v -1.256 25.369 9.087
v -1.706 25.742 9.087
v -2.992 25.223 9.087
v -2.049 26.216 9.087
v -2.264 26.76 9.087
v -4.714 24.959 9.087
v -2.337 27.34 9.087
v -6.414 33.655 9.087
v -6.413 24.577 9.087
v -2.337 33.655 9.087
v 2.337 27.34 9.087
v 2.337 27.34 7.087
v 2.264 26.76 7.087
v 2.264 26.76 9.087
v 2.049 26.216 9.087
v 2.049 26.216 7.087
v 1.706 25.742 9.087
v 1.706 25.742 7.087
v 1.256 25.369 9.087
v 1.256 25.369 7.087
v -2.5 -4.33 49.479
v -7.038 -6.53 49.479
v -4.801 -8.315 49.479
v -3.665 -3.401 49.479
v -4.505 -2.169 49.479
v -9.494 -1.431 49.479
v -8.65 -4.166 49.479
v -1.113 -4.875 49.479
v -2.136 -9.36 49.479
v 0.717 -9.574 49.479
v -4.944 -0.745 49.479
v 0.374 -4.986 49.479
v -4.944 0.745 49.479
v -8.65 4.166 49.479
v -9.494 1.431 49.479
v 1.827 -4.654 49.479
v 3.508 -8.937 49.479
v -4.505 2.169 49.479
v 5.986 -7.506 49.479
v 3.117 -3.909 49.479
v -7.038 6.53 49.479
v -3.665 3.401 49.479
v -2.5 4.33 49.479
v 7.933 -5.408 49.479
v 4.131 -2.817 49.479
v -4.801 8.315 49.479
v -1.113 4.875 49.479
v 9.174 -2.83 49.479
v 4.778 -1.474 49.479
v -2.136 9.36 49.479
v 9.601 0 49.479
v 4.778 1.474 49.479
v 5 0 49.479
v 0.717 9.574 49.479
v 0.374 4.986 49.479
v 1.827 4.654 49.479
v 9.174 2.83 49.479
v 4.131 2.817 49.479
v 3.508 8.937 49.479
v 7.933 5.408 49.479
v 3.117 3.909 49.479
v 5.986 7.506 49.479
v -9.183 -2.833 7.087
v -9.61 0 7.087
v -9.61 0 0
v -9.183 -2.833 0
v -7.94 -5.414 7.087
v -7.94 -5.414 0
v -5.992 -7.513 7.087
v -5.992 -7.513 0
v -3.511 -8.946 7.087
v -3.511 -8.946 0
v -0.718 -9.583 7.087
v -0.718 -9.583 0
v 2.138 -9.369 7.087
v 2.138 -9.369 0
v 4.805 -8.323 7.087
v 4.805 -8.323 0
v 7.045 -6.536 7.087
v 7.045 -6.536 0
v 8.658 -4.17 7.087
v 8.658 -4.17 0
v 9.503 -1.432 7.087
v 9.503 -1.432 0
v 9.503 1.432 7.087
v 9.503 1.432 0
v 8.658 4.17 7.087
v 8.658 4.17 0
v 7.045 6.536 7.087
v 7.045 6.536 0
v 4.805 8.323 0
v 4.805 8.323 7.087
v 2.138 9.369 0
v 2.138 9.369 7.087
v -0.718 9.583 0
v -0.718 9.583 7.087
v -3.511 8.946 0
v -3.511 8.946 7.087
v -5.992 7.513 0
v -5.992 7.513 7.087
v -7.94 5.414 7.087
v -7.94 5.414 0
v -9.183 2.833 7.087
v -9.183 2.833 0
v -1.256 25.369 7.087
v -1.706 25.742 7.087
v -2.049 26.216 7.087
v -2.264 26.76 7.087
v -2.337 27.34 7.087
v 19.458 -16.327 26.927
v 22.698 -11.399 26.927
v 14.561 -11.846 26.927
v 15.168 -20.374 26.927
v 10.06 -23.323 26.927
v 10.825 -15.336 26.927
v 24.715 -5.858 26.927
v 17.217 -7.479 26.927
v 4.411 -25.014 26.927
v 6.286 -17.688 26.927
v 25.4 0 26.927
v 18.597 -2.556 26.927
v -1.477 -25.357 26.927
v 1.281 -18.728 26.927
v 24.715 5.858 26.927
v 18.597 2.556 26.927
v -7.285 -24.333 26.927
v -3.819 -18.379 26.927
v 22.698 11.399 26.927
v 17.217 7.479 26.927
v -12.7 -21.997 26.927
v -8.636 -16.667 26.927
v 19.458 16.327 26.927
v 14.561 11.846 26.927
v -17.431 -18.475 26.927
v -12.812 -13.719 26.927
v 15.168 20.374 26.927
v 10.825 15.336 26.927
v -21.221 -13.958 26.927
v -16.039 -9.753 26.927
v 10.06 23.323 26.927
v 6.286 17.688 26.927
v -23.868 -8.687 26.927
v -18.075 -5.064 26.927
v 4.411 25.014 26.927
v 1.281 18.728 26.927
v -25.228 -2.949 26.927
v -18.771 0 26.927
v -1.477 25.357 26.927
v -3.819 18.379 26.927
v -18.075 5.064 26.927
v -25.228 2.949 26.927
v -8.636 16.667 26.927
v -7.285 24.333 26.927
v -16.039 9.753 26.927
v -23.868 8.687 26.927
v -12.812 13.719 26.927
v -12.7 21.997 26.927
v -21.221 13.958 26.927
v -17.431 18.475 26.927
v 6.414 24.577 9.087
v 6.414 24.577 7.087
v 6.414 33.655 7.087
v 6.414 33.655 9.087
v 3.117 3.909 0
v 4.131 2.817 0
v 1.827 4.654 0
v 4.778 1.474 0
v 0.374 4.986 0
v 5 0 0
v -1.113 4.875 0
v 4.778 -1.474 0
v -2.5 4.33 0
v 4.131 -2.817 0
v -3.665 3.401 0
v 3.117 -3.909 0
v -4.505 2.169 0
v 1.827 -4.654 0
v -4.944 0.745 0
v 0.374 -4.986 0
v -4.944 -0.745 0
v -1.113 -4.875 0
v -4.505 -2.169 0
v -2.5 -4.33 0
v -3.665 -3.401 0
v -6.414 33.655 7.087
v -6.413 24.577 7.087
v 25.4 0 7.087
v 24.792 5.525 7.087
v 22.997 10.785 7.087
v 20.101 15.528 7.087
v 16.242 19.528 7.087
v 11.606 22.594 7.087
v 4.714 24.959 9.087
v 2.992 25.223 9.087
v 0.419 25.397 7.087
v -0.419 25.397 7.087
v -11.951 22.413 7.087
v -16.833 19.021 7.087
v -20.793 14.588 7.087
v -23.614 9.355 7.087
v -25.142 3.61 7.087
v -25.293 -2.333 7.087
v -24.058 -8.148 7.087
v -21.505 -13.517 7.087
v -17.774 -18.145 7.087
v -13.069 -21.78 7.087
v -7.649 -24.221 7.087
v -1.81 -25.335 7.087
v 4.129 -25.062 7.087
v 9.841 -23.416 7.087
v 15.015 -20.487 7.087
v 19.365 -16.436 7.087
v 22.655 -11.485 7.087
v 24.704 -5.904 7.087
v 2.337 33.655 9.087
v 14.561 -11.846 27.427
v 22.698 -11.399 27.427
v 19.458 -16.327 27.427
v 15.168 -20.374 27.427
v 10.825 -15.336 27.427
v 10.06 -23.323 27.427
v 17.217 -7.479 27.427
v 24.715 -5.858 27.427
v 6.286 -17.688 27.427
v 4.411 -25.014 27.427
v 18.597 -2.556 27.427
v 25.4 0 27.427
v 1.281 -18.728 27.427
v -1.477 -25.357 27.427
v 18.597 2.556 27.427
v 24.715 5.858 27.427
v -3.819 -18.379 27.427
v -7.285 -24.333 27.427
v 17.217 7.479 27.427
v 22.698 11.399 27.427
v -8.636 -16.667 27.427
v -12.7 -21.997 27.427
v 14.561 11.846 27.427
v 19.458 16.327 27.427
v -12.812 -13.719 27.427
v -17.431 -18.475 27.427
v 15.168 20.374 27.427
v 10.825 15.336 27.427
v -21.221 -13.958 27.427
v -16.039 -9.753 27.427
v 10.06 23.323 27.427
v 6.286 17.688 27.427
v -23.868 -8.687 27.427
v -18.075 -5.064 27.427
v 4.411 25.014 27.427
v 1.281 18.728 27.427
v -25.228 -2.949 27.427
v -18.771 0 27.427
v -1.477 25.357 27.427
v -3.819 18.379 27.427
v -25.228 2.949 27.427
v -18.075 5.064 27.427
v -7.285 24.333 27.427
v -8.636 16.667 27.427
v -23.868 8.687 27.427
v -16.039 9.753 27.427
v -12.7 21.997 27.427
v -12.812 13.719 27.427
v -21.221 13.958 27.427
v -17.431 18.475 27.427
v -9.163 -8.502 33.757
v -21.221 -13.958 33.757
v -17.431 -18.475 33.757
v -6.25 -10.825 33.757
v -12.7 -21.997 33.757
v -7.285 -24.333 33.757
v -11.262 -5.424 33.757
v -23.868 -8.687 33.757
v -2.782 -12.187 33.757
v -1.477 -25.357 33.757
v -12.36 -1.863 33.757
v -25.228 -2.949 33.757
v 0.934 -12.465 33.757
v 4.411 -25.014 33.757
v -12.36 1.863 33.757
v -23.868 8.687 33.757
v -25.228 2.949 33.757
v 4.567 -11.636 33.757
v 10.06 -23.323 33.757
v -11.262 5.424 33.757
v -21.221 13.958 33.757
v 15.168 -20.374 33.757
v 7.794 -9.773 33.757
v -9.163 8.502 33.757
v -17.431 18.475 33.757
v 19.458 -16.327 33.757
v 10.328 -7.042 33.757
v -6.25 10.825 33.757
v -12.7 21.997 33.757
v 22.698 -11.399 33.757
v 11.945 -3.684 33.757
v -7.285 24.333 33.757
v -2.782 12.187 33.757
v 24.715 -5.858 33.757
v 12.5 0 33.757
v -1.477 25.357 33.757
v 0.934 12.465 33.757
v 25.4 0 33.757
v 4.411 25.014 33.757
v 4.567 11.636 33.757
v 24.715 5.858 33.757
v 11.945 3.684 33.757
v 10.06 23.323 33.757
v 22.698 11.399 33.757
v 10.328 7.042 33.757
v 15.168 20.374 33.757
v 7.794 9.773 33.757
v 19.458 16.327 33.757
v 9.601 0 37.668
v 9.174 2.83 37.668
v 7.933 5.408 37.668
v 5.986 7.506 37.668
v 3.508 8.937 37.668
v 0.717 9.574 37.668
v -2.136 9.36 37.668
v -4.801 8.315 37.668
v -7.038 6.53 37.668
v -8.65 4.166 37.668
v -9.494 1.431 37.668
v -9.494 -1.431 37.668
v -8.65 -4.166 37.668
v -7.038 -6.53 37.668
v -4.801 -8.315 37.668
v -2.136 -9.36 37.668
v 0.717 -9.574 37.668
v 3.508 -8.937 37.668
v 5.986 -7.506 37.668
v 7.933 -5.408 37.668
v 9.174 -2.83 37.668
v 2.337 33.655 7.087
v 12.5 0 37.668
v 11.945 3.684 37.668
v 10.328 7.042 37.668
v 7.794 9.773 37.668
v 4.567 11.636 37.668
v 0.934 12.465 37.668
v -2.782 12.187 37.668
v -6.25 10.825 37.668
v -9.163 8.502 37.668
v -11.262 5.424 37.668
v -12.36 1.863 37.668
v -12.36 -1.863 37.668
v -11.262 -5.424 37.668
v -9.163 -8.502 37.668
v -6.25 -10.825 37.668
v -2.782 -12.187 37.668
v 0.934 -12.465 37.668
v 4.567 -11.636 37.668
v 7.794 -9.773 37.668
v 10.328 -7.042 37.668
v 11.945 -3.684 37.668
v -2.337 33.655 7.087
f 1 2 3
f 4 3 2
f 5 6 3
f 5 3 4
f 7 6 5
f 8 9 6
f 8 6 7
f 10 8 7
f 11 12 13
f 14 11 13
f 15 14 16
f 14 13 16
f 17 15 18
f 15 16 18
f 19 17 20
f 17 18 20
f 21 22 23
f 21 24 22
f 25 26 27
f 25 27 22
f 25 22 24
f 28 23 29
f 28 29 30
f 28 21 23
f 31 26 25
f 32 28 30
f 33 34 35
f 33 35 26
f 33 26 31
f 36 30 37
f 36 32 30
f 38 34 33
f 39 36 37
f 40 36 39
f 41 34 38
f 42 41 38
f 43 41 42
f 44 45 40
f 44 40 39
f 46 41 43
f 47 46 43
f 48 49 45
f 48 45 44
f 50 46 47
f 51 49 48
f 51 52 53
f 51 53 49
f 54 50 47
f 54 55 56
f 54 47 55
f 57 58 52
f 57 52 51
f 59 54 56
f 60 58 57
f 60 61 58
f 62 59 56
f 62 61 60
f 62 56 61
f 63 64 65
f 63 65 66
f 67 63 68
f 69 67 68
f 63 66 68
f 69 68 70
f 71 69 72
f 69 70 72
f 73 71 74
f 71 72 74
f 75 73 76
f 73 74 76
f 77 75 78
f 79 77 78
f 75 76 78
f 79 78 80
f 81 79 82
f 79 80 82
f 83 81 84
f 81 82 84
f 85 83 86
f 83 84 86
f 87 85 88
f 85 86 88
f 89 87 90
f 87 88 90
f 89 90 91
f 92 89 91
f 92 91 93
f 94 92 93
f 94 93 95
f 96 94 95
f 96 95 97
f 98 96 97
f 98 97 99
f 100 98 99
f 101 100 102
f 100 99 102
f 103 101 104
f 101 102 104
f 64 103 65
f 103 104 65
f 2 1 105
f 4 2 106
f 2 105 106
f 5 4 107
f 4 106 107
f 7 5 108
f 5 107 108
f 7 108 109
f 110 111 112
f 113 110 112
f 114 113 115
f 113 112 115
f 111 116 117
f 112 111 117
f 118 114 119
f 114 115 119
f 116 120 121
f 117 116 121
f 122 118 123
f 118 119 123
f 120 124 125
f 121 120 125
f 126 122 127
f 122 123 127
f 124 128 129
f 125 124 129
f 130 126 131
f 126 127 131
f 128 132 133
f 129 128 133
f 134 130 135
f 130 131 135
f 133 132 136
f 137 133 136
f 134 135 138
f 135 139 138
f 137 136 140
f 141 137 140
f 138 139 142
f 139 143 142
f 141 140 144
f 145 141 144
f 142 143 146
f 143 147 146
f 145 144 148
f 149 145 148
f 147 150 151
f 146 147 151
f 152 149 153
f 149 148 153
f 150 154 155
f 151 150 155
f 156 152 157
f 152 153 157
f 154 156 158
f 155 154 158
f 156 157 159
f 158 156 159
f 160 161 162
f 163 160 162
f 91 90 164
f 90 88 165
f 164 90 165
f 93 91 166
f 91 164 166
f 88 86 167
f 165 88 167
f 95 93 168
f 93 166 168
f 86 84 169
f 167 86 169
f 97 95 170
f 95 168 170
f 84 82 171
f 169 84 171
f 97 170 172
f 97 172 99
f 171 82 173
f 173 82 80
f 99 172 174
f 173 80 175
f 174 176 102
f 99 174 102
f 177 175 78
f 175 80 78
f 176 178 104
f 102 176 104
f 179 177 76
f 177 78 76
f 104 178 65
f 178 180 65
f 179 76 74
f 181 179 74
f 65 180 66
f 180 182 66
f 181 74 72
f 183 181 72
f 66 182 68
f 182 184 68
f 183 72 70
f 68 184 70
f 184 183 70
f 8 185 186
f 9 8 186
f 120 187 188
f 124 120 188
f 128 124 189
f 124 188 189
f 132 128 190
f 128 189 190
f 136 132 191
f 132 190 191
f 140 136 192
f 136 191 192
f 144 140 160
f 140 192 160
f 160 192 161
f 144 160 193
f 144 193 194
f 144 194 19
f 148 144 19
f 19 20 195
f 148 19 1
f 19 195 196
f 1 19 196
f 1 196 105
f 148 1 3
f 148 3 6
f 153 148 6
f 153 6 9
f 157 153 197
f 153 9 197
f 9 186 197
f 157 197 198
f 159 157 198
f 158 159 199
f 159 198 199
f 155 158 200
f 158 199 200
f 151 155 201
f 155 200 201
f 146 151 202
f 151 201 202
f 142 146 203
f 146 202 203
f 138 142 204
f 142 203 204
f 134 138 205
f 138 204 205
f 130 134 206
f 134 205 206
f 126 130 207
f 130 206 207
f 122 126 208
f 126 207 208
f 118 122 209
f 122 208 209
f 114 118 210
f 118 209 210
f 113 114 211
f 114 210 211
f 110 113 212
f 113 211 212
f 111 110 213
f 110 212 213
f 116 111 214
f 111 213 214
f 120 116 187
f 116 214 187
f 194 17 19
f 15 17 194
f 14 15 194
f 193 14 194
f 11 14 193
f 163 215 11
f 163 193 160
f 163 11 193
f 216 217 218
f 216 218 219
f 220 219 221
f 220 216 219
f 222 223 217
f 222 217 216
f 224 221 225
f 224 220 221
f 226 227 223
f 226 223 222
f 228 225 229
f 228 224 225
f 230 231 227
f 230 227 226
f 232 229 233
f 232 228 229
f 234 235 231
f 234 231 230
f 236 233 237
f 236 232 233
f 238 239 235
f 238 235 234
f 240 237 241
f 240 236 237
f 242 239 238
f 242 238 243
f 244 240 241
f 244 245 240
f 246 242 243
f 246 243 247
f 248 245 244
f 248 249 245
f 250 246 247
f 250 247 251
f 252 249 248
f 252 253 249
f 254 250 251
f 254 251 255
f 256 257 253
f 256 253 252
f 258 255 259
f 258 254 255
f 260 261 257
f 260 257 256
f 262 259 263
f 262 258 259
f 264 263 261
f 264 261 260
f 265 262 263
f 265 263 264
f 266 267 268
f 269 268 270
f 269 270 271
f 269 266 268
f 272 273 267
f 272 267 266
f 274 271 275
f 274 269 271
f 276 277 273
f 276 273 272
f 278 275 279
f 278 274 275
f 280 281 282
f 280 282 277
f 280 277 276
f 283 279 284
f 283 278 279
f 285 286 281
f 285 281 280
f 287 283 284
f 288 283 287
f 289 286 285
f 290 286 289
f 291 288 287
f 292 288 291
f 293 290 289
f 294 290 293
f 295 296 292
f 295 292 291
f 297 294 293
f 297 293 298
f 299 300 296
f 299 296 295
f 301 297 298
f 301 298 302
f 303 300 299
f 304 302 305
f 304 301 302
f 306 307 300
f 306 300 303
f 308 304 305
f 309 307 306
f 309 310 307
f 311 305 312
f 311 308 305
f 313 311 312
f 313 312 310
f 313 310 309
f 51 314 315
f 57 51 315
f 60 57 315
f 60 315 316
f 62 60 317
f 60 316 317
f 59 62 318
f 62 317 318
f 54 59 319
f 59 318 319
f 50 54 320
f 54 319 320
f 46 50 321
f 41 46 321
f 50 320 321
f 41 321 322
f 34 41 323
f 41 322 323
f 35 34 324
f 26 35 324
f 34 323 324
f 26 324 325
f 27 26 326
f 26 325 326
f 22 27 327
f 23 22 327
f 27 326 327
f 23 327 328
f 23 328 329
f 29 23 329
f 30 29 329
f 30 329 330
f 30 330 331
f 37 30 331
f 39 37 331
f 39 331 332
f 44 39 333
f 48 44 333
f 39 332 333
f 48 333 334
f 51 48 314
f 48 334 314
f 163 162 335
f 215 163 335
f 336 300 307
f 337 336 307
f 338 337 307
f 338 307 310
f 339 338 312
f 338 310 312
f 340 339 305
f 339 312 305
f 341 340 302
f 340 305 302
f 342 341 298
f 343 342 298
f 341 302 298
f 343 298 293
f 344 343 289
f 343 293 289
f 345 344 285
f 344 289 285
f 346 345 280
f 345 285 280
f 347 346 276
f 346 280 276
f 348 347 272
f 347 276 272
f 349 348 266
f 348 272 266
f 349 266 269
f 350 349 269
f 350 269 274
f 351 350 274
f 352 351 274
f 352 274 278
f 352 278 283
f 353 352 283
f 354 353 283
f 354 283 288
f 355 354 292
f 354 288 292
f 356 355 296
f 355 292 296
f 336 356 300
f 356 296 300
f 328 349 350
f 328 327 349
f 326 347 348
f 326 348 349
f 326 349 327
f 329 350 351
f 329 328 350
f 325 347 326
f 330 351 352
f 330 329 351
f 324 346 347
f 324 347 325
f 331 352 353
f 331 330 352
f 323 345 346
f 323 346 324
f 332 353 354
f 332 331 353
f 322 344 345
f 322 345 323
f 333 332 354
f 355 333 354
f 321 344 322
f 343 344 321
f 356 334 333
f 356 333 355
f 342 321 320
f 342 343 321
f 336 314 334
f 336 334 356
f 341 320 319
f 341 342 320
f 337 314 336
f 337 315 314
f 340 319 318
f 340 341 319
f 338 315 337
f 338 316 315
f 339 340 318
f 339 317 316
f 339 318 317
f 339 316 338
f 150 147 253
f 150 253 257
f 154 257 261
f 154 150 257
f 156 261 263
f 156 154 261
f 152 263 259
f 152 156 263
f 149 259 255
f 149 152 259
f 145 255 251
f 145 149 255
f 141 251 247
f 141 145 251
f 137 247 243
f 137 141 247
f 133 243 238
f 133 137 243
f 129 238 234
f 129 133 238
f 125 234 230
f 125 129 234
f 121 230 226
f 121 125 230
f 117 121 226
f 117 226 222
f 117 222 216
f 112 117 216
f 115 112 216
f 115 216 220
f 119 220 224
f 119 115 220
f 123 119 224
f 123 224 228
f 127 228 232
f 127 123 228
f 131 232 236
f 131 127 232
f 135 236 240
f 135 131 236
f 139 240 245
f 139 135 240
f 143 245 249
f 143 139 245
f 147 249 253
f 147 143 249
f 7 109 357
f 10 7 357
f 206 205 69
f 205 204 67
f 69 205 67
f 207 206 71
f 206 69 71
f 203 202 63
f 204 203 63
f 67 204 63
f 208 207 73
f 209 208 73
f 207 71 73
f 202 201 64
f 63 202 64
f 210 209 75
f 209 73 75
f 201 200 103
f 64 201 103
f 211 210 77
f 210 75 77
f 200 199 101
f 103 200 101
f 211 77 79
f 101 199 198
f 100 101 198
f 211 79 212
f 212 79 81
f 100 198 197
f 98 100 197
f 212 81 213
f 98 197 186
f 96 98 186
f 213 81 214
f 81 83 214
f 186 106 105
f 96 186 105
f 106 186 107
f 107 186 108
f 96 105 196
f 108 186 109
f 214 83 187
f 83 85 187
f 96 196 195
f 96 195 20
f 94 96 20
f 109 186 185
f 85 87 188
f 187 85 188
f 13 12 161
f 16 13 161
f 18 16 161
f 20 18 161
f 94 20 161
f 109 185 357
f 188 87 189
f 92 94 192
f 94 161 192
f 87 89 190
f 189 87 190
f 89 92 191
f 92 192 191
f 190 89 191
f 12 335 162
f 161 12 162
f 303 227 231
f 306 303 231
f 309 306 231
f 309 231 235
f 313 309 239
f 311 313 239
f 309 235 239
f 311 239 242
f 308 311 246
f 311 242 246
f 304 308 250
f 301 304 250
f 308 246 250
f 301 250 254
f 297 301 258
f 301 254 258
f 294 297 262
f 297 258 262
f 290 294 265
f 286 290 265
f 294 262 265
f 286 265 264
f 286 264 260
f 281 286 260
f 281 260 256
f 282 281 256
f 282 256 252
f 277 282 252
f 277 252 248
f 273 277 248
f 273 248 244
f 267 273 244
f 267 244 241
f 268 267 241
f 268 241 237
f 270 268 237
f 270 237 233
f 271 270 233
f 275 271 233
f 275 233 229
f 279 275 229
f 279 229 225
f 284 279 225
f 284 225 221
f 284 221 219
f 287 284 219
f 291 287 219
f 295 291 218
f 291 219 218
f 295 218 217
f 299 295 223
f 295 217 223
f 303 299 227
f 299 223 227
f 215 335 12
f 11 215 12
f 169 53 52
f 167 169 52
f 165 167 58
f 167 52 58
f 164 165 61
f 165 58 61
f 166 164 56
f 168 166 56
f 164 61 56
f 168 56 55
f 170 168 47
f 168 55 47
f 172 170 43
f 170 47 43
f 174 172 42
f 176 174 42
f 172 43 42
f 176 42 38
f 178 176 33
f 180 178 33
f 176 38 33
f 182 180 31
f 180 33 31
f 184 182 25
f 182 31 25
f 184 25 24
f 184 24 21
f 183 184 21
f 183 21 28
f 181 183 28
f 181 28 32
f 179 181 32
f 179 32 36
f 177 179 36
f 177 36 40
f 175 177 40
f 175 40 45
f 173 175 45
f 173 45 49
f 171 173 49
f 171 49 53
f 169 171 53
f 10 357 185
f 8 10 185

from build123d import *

# Parameters (mm, degrees)
SKETCH1_R           = 9.61
BOSS_EXTRUDE1_DEPTH = 7.087
SKETCH2_R           = 25.4
BOSS_EXTRUDE2_DEPTH = 26.67
SKETCH3_R           = 12.5
BOSS_EXTRUDE3_DEPTH = 3.911
SKETCH4_R           = 9.601
BOSS_EXTRUDE4_DEPTH = 11.811
BOSS_EXTRUDE5_DEPTH = 2
SKETCH5_R           = 5
CUT_EXTRUDE1_DEPTH  = 66.007618523
SKETCH7_OUTSIDE_W   = 71.256
SKETCH7_OUTSIDE_H   = 79.511
SKETCH7_OUTSIDE_R   = 18.771401146
CUT_EXTRUDE2_DEPTH  = 0.5


with BuildPart() as part:
    # Sketch1 → Boss-Extrude1 (new body)
    with BuildSketch(Plane.XY):
        with Locations(Location((0, 0, 0), (0, 0, 180))):
            Circle(SKETCH1_R)
    extrude(amount=BOSS_EXTRUDE1_DEPTH)

    # Sketch2 → Boss-Extrude2 (add)
    with BuildSketch(Plane.XY.offset(7.087)):
        Circle(SKETCH2_R)
    extrude(amount=BOSS_EXTRUDE2_DEPTH)

    # Sketch3 → Boss-Extrude3 (add)
    with BuildSketch(Plane.XY.offset(33.757)):
        Circle(SKETCH3_R)
    extrude(amount=BOSS_EXTRUDE3_DEPTH)

    # Sketch4 → Boss-Extrude4 (add)
    with BuildSketch(Plane.XY.offset(37.668)):
        Circle(SKETCH4_R)
    extrude(amount=BOSS_EXTRUDE4_DEPTH)

    # Sketch6 → Boss-Extrude5 (add)
    with BuildSketch(Plane(origin=(0, 0, 7.087), x_dir=(-1, 0, 0), z_dir=(0, 0, -1))):
        with BuildLine():
            Line((-6.4135, 33.655), (-2.337, 33.655))
            Line((-2.337, 33.655), (-2.337, 27.34))
            ThreePointArc((-2.337, 27.34), (0, 25.003), (2.337, 27.34))
            Line((2.337, 27.34), (2.337, 33.655))
            Line((2.337, 33.655), (6.4135, 33.655))
            Line((6.4135, 33.655), (6.4135, 24.576961117))
            ThreePointArc((6.4135, 24.576961117), (0, -25.4), (-6.4135, 24.576961117))
            Line((-6.4135, 24.576961117), (-6.4135, 33.655))
        make_face()
    extrude(amount=-BOSS_EXTRUDE5_DEPTH)

    # Sketch5 → Cut-Extrude1 (cut, through all)
    with BuildSketch(Plane.XY.offset(49.479)):
        Circle(SKETCH5_R)
    extrude(amount=-CUT_EXTRUDE1_DEPTH, mode=Mode.SUBTRACT)

    # Sketch7 outside → Cut-Extrude2 (cut)
    with BuildSketch(Plane(origin=(0, 0, 26.927), x_dir=(-1, 0, 0), z_dir=(0, 0, -1))):
        with Locations((0, 4.1275)):
            Rectangle(SKETCH7_OUTSIDE_W, SKETCH7_OUTSIDE_H)
        Circle(SKETCH7_OUTSIDE_R, mode=Mode.SUBTRACT)
    extrude(amount=-CUT_EXTRUDE2_DEPTH, mode=Mode.SUBTRACT)


solid = part.part
